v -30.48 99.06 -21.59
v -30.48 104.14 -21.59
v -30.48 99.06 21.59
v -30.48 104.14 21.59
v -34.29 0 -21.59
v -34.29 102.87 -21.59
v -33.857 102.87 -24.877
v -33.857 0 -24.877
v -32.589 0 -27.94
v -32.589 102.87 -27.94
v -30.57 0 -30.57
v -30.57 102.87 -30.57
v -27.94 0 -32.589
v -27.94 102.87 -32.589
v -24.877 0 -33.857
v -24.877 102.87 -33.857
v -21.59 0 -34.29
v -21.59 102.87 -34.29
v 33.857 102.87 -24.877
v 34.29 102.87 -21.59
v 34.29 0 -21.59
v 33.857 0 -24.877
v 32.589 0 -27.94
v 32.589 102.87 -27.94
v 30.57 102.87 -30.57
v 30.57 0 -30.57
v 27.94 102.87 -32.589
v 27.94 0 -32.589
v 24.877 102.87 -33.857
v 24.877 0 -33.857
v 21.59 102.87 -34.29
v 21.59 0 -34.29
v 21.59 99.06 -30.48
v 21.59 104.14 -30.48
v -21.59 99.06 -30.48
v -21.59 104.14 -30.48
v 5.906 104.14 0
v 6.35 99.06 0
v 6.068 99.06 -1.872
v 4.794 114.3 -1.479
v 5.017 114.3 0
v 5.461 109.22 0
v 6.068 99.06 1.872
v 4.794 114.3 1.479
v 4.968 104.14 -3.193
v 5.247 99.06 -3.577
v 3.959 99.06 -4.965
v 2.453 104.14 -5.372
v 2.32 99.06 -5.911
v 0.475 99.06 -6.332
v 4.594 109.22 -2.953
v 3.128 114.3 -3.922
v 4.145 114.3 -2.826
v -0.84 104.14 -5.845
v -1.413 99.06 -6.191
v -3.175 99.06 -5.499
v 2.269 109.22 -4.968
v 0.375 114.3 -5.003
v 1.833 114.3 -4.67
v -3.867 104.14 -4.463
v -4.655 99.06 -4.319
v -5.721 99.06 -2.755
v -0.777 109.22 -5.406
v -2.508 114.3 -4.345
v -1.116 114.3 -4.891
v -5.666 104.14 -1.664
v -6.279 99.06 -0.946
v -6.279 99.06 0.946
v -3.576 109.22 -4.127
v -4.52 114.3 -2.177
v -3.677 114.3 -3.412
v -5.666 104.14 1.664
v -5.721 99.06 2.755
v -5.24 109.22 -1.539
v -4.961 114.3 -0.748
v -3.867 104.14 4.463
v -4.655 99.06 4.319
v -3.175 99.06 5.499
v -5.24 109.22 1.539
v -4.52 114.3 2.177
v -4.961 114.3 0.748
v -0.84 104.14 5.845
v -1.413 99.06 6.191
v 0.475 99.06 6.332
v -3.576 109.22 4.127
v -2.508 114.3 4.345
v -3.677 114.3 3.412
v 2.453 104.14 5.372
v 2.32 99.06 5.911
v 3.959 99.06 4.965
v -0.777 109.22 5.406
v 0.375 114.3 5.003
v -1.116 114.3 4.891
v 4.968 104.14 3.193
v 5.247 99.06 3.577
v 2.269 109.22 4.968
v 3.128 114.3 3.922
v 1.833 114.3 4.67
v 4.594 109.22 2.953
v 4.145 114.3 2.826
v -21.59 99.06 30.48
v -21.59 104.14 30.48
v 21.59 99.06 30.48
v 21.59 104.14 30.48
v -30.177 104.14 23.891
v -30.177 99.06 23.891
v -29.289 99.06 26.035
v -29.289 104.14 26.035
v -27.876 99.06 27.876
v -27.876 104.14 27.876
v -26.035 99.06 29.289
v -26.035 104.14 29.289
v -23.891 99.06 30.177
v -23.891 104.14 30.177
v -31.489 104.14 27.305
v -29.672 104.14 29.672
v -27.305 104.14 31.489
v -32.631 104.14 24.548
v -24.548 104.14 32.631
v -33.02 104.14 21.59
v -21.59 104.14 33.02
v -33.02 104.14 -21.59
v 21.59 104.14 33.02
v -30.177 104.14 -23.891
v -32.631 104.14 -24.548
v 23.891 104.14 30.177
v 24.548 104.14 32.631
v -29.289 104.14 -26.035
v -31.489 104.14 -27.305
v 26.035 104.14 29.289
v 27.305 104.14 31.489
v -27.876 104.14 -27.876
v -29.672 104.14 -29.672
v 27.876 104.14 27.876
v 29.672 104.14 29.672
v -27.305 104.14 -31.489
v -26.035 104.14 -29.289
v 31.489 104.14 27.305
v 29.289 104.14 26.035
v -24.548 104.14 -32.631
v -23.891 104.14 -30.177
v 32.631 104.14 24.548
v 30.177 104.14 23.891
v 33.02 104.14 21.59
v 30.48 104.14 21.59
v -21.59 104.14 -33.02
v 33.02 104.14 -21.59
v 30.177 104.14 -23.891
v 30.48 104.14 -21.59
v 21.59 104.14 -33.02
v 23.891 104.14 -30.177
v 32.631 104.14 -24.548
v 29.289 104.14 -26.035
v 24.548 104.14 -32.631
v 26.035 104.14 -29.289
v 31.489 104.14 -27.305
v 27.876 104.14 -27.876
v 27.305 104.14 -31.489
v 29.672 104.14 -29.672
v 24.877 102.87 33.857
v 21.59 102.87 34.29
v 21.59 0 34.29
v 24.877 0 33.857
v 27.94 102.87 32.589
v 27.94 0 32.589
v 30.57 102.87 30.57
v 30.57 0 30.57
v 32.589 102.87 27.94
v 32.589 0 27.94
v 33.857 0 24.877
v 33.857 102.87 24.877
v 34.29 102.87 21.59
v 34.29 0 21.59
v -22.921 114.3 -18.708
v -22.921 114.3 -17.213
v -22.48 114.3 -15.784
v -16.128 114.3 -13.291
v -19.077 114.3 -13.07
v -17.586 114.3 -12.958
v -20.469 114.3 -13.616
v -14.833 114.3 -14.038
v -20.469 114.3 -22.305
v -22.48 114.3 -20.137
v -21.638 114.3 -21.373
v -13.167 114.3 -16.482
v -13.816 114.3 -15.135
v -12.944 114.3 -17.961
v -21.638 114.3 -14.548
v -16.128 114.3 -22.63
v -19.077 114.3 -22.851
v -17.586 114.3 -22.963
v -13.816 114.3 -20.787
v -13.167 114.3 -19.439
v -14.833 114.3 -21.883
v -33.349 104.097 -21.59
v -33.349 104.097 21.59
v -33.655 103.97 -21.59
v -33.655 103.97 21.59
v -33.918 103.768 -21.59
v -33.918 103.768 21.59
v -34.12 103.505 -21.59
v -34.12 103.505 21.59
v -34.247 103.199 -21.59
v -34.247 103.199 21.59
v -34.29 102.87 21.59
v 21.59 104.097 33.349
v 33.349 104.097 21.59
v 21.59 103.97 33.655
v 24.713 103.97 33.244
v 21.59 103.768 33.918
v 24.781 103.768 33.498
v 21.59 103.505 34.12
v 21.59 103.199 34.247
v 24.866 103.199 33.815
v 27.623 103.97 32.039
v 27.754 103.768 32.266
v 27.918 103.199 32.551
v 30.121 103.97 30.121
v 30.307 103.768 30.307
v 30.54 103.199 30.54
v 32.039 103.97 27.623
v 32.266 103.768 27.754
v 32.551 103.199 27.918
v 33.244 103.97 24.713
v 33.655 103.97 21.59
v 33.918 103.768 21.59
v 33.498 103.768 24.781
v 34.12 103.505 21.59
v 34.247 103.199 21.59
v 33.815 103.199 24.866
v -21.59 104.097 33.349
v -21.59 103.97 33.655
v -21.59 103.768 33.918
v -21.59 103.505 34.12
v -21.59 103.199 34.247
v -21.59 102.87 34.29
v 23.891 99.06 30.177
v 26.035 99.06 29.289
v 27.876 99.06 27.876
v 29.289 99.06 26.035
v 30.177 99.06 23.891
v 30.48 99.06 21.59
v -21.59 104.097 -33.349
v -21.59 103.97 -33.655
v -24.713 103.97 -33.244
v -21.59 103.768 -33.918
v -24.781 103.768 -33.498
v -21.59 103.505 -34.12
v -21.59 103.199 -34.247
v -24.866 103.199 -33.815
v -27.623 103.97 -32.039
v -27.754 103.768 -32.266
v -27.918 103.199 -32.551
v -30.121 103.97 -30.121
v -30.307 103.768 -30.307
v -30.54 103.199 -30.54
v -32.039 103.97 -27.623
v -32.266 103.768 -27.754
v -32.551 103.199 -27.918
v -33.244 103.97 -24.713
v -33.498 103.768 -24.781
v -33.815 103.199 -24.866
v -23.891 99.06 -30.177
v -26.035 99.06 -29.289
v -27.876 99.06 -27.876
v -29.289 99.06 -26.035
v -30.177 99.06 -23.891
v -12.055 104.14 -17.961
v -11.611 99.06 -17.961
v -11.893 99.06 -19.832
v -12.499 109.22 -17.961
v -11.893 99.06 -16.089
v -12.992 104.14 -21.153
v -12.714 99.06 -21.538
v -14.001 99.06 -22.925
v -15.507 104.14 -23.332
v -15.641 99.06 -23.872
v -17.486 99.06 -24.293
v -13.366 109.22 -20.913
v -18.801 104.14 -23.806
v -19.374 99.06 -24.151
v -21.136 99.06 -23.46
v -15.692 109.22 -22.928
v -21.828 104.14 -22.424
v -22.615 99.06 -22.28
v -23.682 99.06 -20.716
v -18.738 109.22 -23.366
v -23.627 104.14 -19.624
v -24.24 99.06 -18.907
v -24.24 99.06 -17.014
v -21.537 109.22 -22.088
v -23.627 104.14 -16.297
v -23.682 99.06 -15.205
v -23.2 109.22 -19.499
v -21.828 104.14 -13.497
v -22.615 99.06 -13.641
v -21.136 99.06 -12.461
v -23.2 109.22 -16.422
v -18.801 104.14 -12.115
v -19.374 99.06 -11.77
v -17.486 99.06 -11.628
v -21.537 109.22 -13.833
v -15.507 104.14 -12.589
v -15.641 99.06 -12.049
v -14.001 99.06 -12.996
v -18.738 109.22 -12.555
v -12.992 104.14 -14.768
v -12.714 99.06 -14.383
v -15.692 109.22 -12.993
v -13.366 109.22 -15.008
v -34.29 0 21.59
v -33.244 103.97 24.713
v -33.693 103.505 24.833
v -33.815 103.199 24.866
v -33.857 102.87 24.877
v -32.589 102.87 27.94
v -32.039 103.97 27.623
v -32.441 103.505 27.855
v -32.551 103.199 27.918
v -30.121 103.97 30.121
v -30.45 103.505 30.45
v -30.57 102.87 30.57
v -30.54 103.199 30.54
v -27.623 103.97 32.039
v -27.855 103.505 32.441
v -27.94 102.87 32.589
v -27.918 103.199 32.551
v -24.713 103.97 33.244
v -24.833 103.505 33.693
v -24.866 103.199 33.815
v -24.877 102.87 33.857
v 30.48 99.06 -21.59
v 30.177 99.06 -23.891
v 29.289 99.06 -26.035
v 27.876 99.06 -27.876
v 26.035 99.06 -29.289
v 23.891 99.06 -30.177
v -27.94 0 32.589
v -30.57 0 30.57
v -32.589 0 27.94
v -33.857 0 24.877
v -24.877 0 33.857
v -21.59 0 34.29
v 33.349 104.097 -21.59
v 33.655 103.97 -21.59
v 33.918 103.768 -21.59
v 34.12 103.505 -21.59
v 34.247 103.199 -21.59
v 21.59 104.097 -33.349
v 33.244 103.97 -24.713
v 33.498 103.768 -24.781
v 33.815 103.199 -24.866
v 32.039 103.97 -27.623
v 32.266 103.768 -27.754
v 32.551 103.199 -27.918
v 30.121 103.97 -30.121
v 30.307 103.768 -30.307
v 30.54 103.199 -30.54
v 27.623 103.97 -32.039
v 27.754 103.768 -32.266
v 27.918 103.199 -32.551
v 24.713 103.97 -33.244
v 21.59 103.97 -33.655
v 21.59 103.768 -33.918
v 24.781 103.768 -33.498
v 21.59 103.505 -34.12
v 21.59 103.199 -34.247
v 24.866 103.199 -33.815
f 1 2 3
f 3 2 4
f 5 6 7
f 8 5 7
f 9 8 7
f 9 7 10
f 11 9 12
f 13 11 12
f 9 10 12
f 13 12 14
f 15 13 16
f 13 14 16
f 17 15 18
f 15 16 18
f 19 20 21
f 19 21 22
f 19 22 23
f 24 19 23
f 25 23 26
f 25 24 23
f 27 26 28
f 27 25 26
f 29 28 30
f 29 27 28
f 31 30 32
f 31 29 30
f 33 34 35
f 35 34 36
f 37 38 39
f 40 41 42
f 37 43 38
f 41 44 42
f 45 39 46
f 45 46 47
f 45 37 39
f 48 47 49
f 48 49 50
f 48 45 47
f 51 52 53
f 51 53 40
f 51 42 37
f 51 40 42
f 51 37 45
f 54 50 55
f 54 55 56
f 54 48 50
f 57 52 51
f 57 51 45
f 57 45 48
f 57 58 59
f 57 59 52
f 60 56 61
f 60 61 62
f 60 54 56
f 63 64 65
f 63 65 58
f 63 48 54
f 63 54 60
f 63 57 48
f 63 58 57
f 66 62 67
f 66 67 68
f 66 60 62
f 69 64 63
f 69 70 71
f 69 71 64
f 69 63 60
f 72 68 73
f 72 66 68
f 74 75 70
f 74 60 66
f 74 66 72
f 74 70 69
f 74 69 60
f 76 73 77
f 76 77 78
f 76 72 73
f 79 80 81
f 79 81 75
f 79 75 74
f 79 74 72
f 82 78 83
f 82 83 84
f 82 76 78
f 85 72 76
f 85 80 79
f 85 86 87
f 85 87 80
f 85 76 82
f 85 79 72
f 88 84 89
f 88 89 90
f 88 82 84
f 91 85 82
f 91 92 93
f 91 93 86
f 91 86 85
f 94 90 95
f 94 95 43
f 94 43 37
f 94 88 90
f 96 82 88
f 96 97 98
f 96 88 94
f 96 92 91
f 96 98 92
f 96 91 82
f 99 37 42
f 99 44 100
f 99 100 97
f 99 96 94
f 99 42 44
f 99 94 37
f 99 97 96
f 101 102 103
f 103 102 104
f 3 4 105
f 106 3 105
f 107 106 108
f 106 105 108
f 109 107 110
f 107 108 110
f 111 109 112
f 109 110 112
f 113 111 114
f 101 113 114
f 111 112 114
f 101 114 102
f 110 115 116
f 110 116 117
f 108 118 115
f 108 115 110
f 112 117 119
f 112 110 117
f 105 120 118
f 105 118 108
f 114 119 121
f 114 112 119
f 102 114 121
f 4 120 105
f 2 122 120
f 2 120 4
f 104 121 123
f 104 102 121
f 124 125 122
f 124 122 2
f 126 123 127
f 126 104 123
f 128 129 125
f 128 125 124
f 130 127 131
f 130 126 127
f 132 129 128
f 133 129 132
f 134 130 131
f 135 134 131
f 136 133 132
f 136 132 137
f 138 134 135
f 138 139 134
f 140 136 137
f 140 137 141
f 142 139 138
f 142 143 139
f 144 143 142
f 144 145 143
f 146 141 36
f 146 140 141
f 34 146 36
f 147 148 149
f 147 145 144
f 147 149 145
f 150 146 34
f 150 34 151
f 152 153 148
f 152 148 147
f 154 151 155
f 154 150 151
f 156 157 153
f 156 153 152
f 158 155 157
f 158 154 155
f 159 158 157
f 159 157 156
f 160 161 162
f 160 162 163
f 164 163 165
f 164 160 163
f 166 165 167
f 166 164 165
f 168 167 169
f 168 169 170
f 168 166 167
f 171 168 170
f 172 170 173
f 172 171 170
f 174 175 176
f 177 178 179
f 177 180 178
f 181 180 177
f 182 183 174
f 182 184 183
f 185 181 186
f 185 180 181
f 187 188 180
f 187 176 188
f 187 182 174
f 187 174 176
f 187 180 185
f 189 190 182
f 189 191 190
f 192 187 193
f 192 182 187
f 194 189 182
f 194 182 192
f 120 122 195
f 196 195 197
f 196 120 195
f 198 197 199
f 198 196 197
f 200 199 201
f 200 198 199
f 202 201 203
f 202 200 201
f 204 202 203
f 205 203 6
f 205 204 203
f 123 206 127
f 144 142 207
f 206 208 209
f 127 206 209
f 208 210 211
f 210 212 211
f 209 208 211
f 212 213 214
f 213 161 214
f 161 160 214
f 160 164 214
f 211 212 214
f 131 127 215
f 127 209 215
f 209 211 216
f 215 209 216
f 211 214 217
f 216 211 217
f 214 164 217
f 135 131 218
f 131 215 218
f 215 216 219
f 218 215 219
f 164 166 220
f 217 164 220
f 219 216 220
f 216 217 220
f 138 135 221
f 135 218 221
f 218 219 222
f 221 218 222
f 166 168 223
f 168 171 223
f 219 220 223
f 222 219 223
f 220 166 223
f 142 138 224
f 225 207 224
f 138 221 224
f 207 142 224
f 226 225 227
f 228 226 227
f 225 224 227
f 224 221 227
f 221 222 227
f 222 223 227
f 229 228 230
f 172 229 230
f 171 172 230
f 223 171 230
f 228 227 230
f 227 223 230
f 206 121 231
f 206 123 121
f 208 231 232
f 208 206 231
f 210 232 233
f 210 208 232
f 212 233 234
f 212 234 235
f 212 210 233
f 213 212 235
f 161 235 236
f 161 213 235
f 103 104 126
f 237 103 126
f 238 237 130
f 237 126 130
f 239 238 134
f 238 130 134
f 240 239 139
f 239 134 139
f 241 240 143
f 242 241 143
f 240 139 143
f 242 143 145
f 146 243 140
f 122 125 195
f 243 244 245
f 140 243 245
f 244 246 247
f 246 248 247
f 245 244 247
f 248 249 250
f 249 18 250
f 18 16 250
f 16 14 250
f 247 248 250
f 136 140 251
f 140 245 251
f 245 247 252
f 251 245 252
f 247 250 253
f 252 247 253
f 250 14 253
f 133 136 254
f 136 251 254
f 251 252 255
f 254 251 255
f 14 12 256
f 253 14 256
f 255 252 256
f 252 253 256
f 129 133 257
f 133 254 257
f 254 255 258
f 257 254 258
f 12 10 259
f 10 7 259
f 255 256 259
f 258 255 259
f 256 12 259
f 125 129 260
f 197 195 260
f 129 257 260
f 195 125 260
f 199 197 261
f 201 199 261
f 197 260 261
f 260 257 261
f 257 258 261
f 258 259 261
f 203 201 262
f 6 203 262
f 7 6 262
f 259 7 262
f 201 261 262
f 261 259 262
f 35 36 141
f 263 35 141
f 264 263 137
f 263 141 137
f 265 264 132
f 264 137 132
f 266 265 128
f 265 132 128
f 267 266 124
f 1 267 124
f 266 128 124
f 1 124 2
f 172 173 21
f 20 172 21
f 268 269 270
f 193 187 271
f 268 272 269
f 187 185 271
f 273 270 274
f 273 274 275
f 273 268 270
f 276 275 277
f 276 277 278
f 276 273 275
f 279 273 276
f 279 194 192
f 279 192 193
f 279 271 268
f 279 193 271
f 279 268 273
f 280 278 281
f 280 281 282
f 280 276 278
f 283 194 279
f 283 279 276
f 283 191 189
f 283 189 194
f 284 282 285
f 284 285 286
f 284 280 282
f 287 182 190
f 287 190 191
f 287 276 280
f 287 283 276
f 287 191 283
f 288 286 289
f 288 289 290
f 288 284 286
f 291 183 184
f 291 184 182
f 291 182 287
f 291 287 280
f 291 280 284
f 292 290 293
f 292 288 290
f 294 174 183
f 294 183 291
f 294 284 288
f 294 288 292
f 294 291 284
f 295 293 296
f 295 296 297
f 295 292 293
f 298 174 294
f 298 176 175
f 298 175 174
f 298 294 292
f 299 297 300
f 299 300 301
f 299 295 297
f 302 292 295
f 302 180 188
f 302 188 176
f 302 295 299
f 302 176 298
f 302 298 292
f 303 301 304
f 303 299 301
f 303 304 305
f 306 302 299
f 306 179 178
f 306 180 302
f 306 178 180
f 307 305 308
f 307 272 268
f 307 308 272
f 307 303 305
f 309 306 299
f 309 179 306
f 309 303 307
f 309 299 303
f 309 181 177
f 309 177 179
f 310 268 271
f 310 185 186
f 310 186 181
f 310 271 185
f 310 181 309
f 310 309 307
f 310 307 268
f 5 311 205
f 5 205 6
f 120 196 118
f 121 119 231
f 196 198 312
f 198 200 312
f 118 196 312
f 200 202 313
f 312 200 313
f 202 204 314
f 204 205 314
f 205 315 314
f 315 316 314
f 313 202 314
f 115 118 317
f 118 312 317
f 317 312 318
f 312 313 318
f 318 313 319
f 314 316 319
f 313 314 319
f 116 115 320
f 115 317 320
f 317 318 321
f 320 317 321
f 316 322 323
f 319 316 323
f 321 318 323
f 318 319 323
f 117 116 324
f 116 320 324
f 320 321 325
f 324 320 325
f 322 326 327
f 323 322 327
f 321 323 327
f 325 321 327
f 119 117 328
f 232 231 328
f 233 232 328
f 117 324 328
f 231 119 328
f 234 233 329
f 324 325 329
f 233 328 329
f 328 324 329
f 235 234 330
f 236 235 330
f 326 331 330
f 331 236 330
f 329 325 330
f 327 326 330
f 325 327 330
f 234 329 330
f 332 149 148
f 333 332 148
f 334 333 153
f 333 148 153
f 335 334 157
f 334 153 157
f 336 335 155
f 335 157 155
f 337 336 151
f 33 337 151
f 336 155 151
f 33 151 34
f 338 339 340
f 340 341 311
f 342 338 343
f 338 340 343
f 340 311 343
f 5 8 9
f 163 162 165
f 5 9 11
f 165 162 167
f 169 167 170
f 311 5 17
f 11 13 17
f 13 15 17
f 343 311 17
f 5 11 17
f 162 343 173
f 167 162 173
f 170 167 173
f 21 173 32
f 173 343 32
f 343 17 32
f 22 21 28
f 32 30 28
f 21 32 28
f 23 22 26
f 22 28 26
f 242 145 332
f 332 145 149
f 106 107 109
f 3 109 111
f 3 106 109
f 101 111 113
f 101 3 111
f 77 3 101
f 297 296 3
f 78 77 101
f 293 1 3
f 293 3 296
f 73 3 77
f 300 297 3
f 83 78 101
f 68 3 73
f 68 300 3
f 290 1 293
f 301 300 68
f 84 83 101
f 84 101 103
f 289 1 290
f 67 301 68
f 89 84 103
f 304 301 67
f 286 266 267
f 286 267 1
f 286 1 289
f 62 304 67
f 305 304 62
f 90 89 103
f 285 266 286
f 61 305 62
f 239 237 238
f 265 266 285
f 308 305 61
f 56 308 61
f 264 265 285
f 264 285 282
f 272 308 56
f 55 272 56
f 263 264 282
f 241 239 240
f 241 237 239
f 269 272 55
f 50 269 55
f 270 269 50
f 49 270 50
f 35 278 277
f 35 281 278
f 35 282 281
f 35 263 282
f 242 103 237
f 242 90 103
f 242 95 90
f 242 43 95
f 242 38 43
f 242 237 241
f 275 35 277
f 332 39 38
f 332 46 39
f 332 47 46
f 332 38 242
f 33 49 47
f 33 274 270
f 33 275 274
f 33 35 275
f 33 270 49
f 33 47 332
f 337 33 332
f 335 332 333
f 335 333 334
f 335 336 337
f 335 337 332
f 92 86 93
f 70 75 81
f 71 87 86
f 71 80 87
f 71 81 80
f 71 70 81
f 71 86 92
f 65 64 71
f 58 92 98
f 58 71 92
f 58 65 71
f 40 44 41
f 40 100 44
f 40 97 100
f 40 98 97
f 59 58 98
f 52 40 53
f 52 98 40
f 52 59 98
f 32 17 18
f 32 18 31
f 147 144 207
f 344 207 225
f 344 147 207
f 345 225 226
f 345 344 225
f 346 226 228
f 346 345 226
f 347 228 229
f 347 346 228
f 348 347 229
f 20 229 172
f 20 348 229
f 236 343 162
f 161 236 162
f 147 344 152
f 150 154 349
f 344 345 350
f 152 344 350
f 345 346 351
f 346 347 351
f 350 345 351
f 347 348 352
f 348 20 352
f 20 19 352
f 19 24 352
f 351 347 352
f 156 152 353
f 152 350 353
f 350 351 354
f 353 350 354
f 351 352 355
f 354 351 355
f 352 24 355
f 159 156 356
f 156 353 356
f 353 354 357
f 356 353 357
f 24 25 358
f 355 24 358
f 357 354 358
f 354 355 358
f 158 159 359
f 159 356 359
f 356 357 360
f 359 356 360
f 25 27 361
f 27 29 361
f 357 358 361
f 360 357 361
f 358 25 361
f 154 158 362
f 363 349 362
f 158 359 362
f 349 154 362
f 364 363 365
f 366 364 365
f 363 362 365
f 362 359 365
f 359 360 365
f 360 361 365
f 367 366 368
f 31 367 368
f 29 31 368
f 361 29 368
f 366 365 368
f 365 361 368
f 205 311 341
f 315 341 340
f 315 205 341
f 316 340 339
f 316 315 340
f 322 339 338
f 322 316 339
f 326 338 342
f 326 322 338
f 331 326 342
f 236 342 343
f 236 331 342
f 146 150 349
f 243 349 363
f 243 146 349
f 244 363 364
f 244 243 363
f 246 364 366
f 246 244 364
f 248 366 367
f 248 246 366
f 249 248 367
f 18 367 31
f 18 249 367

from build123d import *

# Parameters (mm, degrees)
SKETCH1_W          = 68.58
SKETCH1_H          = 68.58
BASE_EXTRUDE_DEPTH = 104.14
SIDE_FILLETS_R     = 12.7
TOP_CUT_DEPTH      = 5.08
TOP_FACE_FILLET_R  = 1.27
SKETCH_TERMINALS_R = 6.35
TERMINALS_DEPTH    = 15.24
TERMINALS_TAPER    = 5


with BuildPart() as part:
    # Sketch1 → Base Extrude (new body)
    with BuildSketch(Plane(origin=(0, 0, 0), x_dir=(1, 0, 0), z_dir=(0, 1, 0))):
        Rectangle(SKETCH1_W, SKETCH1_H)
    extrude(amount=BASE_EXTRUDE_DEPTH)

    # Side Fillets
    side_fillets_edges = [part.edges().sort_by_distance(p)[0] for p in [
        (34.29, 52.07, 34.29),
        (-34.29, 52.07, 34.29),
        (-34.29, 52.07, -34.29),
        (34.29, 52.07, -34.29),
    ]]
    fillet(side_fillets_edges, radius=SIDE_FILLETS_R)

    # Sketch2 → Top Cut (cut)
    with BuildSketch(Plane(origin=(0, 104.14, 0), x_dir=(1, 0, 0), z_dir=(0, 1, 0))):
        with BuildLine():
            Line((-30.48, 21.59), (-30.48, -21.59))
            ThreePointArc((-30.48, -21.59), (-27.876179285, -27.876179285), (-21.59, -30.48))
            Line((-21.59, -30.48), (21.59, -30.48))
            ThreePointArc((21.59, -30.48), (27.876179285, -27.876179285), (30.48, -21.59))
            Line((30.48, -21.59), (30.48, 21.59))
            ThreePointArc((30.48, 21.59), (27.876179285, 27.876179285), (21.59, 30.48))
            Line((21.59, 30.48), (-21.59, 30.48))
            ThreePointArc((-21.59, 30.48), (-27.876179285, 27.876179285), (-30.48, 21.59))
        make_face()
    extrude(amount=-TOP_CUT_DEPTH, mode=Mode.SUBTRACT)

    # Top Face Fillet
    top_face_fillet_edges = [part.edges().sort_by_distance(p)[0] for p in [
        (0, 104.14, 34.29),
        (-34.29, 104.14, 0),
        (34.29, 104.14, 0),
        (0, 104.14, -34.29),
        (30.570256121, 104.14, 30.570256121),
        (30.570256121, 104.14, -30.570256121),
        (-30.570256121, 104.14, -30.570256121),
        (-30.570256121, 104.14, 30.570256121),
    ]]
    fillet(top_face_fillet_edges, radius=TOP_FACE_FILLET_R)

    # Sketch-TERMINALS → Terminals (add)
    with BuildSketch(Plane(origin=(0, 99.06, 0), x_dir=(1, 0, 0), z_dir=(0, 1, 0))):
        Circle(SKETCH_TERMINALS_R)
        with Locations((-17.960512242, 17.960512242)):
            Circle(SKETCH_TERMINALS_R)
    extrude(amount=TERMINALS_DEPTH, taper=TERMINALS_TAPER)


solid = part.part
